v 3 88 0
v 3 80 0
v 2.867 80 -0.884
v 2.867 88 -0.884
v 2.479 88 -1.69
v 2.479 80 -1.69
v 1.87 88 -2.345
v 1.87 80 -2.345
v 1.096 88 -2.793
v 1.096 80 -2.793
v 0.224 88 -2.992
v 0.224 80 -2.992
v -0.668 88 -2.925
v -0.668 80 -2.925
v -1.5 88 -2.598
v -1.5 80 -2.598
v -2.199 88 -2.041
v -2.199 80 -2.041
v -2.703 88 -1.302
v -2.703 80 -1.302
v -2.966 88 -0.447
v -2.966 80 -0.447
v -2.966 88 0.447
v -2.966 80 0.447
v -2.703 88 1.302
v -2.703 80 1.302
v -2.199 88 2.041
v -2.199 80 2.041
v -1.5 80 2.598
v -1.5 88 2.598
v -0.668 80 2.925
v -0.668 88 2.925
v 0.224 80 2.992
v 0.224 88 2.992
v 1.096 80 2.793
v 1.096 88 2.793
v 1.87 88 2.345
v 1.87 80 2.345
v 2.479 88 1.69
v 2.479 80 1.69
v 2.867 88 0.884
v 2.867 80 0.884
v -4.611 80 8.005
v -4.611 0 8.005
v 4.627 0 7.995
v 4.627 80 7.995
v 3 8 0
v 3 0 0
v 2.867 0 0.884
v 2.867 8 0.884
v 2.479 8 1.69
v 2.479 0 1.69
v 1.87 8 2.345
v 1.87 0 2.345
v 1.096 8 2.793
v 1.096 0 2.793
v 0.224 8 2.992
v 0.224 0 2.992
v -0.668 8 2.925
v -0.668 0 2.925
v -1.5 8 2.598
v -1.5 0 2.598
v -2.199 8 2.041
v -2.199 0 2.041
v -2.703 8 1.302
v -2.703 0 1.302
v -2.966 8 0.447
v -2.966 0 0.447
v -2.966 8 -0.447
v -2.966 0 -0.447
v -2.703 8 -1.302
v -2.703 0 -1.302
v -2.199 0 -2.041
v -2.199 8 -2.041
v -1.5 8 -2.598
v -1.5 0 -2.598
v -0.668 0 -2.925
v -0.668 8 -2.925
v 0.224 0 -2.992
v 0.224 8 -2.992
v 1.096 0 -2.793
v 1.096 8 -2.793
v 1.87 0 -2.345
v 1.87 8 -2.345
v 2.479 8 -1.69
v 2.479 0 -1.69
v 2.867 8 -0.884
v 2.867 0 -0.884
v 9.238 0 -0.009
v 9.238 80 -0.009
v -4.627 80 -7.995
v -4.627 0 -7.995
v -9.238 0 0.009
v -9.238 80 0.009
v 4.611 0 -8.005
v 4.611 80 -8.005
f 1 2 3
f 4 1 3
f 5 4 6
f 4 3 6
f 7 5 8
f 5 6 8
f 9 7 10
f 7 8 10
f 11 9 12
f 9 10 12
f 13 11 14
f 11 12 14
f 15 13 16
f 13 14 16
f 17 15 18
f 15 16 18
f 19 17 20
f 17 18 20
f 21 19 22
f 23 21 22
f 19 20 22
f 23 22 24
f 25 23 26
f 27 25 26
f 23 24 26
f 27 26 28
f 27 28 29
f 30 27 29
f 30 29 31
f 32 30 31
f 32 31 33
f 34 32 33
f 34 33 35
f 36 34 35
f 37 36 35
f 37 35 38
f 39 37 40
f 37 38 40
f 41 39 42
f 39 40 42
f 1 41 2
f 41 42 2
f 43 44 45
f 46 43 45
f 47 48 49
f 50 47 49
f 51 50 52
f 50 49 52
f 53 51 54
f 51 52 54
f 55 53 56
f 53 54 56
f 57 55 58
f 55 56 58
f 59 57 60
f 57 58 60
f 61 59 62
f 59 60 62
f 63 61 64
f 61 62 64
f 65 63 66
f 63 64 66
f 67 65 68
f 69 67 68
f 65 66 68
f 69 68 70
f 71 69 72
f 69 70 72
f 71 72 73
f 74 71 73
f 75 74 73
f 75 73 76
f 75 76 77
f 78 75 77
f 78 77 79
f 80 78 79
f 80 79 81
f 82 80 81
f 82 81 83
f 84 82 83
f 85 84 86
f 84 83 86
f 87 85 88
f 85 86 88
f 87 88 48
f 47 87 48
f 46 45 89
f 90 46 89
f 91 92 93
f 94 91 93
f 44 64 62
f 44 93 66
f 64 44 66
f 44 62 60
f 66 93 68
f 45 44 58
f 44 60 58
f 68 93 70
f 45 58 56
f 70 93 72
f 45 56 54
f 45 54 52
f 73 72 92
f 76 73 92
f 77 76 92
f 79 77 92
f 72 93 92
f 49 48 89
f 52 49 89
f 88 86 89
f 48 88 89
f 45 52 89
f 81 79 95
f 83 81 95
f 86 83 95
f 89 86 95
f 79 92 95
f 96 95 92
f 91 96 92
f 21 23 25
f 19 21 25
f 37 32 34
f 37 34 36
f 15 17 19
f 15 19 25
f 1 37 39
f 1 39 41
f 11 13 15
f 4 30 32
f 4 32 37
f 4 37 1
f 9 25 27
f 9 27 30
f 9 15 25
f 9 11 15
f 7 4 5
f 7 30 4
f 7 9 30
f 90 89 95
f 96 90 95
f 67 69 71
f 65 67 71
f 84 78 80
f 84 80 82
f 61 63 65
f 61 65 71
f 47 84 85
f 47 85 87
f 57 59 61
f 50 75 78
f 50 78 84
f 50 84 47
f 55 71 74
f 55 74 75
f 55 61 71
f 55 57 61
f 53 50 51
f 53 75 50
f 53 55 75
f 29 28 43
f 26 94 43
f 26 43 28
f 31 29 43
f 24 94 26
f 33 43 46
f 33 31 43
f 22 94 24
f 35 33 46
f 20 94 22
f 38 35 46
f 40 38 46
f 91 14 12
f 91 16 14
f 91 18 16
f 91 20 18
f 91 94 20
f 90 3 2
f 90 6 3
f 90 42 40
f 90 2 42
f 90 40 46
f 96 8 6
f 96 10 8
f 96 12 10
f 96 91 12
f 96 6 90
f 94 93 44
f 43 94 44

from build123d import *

# Parameters (mm, degrees)
EXTRUDE_1_DEPTH     = 80
SKETCH_2_R          = 3
EXTRUDE_2_DEPTH     = 8
SKETCH_3_R          = 3
CUT_EXTRUDE_1_DEPTH = 8


with BuildPart() as part:
    # 草图1 → 凸台-拉伸1 (new body)
    with BuildSketch(Plane(origin=(0, 0, 0), x_dir=(1, 0, 0), z_dir=(0, 1, 0))):
        Polygon((4.610693432, 8.004676097), (-4.626906133, 7.995315689), (-9.237599565, -0.009360407), (-4.610693432, -8.004676097), (4.626906133, -7.995315689), (9.237599565, 0.009360407), align=None)
    extrude(amount=EXTRUDE_1_DEPTH)

    # 草图2 → 凸台-拉伸2 (add)
    with BuildSketch(Plane(origin=(0, 80, 0), x_dir=(1, 0, 0), z_dir=(0, 1, 0))):
        Circle(SKETCH_2_R)
    extrude(amount=EXTRUDE_2_DEPTH)

    # 草图3 → 切除-拉伸1 (cut)
    with BuildSketch(Plane.XZ):
        Circle(SKETCH_3_R)
    extrude(amount=-CUT_EXTRUDE_1_DEPTH, mode=Mode.SUBTRACT)


solid = part.part
